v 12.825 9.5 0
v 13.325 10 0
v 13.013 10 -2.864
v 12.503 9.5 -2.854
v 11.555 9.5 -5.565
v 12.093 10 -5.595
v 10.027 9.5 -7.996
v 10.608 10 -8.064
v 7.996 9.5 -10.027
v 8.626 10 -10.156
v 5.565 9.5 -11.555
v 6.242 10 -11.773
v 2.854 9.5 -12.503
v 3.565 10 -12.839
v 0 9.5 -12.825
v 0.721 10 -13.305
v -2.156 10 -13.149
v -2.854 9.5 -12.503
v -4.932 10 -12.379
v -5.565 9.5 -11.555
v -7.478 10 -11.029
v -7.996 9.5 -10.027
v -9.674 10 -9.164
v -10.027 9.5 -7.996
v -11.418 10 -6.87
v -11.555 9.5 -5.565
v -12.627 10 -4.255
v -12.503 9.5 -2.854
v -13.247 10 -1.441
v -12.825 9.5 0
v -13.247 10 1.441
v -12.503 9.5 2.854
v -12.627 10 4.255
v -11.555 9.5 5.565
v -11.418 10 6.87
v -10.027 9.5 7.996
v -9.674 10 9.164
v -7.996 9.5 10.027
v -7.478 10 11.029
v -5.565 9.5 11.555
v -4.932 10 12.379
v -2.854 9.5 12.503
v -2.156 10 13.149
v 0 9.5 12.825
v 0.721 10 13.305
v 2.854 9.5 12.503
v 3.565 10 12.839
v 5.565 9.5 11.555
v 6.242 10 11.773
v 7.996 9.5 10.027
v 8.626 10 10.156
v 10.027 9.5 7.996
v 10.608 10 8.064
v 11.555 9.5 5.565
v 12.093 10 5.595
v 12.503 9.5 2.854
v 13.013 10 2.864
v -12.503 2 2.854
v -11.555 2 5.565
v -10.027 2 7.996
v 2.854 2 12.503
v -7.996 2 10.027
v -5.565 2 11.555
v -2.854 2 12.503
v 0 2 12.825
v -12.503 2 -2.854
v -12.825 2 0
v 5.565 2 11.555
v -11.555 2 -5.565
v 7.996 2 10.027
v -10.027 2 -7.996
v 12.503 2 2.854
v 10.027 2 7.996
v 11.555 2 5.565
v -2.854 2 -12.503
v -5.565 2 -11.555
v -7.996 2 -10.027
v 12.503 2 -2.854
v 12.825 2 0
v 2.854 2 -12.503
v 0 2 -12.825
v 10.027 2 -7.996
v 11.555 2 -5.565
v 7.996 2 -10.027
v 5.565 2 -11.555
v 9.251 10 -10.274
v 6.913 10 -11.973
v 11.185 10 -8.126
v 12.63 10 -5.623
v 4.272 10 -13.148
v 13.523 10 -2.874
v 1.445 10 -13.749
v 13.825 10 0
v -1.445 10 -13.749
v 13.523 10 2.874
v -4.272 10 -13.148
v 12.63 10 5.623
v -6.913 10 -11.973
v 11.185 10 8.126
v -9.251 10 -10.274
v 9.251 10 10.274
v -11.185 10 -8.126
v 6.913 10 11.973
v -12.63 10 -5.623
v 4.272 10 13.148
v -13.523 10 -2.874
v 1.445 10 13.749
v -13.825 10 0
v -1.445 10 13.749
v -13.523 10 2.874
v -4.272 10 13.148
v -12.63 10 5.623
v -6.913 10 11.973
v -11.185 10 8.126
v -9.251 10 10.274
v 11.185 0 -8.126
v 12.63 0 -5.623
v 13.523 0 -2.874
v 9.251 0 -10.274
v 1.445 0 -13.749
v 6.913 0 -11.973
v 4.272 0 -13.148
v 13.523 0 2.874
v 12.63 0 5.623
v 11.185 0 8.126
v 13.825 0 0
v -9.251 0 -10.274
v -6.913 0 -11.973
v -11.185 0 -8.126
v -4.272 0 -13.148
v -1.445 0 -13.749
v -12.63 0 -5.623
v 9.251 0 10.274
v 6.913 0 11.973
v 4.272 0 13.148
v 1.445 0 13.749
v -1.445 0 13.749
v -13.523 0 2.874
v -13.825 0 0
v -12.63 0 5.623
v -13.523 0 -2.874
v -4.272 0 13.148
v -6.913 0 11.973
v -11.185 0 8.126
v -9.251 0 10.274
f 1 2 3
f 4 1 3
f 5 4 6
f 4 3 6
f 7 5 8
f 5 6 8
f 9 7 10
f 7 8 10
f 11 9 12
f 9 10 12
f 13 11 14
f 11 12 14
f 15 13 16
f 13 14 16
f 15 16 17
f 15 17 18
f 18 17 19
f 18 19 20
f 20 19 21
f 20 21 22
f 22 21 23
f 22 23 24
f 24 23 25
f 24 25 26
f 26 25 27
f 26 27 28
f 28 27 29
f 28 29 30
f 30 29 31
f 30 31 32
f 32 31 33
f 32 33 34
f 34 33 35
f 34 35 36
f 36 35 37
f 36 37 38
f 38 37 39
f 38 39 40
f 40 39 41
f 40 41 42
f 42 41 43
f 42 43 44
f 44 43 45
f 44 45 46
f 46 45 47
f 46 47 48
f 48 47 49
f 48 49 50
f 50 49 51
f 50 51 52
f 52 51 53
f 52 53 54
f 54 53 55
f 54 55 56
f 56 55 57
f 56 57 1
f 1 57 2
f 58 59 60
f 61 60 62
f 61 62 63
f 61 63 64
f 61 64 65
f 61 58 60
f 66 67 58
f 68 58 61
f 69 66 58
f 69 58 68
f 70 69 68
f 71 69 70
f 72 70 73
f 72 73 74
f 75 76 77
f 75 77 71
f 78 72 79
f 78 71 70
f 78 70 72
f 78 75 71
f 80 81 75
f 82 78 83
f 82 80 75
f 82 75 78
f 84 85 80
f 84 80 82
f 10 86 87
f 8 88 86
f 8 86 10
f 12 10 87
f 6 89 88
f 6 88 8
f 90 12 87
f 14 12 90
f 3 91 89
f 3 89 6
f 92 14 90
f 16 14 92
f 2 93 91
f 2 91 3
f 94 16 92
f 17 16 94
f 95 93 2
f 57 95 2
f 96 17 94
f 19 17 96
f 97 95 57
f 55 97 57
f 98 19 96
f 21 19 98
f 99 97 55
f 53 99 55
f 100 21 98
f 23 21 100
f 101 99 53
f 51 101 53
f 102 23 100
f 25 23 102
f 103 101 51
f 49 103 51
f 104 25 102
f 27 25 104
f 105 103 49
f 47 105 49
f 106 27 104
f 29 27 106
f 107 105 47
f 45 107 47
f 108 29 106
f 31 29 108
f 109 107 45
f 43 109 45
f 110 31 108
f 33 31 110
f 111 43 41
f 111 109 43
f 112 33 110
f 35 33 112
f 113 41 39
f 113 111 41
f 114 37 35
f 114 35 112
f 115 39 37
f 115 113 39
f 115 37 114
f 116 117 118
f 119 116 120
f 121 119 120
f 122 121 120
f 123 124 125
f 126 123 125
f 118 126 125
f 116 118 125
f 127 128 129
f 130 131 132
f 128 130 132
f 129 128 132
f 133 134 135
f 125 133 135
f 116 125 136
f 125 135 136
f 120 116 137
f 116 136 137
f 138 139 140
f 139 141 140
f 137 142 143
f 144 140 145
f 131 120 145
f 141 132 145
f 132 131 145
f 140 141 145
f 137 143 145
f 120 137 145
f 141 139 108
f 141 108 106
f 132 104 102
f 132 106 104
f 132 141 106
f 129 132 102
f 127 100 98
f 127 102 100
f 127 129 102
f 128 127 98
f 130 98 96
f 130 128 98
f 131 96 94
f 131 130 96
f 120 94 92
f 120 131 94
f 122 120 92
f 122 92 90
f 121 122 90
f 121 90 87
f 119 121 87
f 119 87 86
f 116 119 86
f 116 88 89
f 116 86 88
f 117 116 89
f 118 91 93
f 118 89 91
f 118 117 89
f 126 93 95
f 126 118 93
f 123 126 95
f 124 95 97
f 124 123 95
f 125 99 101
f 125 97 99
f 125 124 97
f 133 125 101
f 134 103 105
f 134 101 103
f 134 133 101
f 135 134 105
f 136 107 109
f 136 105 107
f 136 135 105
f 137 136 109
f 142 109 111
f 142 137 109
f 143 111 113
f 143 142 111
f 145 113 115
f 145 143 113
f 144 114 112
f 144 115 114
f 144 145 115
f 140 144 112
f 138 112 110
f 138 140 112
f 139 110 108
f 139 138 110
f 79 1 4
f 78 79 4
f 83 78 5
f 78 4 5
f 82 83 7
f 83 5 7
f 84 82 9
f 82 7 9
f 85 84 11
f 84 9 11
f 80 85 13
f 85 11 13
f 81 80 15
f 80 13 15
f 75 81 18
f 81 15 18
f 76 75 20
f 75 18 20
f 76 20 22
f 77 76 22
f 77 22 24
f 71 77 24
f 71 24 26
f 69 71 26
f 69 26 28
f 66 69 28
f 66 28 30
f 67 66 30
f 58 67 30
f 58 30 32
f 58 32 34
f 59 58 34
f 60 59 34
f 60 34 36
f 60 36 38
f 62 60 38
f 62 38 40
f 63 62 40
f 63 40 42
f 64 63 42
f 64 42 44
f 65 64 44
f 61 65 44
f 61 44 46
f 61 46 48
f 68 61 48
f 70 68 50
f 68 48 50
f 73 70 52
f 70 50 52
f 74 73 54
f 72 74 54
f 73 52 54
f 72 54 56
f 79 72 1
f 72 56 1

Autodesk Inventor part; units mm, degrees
ref_plane "YZ Plane" through (0, 0, 0) normal (1, 0, 0) x (0, 1, 0)
ref_plane "XZ Plane" through (0, 0, 0) normal (0, 1, 0) x (-1, 0, 0)
ref_plane "XY Plane" through (0, 0, 0) normal (0, 0, 1) x (1, 0, 0)
sketch "Sketch1" plane through (0, 0, 0) normal (0, 1, 0) x (-1, 0, 0)
  circle A0 centre (0, 0) radius 12.825
  circle A1 centre (0, 0) radius 13.825
  dimension "d0" = 25.65
  dimension "d1" = 27.65
extrude "Extrusion1" add sketch "Sketch1" along normal blind 10 contours A0 | A1
sketch "Sketch3" plane through (0, 10, 0) normal (0, 1, 0) x (1, 0, 0)
  circle A0 centre (0, 0) radius 12.825
  circle A1 centre (0, 0) radius 13.825
  dimension "d11" = 25.65
  dimension "d12" = 27.65
extrude "Extrusion3" cut sketch "Sketch3" against normal blind 8 contours A0
chamfer "Chamfer2" distance 0.5 angle 45 1 edges at (-12.825, 10, 0)
properties part number "TubeCap"
